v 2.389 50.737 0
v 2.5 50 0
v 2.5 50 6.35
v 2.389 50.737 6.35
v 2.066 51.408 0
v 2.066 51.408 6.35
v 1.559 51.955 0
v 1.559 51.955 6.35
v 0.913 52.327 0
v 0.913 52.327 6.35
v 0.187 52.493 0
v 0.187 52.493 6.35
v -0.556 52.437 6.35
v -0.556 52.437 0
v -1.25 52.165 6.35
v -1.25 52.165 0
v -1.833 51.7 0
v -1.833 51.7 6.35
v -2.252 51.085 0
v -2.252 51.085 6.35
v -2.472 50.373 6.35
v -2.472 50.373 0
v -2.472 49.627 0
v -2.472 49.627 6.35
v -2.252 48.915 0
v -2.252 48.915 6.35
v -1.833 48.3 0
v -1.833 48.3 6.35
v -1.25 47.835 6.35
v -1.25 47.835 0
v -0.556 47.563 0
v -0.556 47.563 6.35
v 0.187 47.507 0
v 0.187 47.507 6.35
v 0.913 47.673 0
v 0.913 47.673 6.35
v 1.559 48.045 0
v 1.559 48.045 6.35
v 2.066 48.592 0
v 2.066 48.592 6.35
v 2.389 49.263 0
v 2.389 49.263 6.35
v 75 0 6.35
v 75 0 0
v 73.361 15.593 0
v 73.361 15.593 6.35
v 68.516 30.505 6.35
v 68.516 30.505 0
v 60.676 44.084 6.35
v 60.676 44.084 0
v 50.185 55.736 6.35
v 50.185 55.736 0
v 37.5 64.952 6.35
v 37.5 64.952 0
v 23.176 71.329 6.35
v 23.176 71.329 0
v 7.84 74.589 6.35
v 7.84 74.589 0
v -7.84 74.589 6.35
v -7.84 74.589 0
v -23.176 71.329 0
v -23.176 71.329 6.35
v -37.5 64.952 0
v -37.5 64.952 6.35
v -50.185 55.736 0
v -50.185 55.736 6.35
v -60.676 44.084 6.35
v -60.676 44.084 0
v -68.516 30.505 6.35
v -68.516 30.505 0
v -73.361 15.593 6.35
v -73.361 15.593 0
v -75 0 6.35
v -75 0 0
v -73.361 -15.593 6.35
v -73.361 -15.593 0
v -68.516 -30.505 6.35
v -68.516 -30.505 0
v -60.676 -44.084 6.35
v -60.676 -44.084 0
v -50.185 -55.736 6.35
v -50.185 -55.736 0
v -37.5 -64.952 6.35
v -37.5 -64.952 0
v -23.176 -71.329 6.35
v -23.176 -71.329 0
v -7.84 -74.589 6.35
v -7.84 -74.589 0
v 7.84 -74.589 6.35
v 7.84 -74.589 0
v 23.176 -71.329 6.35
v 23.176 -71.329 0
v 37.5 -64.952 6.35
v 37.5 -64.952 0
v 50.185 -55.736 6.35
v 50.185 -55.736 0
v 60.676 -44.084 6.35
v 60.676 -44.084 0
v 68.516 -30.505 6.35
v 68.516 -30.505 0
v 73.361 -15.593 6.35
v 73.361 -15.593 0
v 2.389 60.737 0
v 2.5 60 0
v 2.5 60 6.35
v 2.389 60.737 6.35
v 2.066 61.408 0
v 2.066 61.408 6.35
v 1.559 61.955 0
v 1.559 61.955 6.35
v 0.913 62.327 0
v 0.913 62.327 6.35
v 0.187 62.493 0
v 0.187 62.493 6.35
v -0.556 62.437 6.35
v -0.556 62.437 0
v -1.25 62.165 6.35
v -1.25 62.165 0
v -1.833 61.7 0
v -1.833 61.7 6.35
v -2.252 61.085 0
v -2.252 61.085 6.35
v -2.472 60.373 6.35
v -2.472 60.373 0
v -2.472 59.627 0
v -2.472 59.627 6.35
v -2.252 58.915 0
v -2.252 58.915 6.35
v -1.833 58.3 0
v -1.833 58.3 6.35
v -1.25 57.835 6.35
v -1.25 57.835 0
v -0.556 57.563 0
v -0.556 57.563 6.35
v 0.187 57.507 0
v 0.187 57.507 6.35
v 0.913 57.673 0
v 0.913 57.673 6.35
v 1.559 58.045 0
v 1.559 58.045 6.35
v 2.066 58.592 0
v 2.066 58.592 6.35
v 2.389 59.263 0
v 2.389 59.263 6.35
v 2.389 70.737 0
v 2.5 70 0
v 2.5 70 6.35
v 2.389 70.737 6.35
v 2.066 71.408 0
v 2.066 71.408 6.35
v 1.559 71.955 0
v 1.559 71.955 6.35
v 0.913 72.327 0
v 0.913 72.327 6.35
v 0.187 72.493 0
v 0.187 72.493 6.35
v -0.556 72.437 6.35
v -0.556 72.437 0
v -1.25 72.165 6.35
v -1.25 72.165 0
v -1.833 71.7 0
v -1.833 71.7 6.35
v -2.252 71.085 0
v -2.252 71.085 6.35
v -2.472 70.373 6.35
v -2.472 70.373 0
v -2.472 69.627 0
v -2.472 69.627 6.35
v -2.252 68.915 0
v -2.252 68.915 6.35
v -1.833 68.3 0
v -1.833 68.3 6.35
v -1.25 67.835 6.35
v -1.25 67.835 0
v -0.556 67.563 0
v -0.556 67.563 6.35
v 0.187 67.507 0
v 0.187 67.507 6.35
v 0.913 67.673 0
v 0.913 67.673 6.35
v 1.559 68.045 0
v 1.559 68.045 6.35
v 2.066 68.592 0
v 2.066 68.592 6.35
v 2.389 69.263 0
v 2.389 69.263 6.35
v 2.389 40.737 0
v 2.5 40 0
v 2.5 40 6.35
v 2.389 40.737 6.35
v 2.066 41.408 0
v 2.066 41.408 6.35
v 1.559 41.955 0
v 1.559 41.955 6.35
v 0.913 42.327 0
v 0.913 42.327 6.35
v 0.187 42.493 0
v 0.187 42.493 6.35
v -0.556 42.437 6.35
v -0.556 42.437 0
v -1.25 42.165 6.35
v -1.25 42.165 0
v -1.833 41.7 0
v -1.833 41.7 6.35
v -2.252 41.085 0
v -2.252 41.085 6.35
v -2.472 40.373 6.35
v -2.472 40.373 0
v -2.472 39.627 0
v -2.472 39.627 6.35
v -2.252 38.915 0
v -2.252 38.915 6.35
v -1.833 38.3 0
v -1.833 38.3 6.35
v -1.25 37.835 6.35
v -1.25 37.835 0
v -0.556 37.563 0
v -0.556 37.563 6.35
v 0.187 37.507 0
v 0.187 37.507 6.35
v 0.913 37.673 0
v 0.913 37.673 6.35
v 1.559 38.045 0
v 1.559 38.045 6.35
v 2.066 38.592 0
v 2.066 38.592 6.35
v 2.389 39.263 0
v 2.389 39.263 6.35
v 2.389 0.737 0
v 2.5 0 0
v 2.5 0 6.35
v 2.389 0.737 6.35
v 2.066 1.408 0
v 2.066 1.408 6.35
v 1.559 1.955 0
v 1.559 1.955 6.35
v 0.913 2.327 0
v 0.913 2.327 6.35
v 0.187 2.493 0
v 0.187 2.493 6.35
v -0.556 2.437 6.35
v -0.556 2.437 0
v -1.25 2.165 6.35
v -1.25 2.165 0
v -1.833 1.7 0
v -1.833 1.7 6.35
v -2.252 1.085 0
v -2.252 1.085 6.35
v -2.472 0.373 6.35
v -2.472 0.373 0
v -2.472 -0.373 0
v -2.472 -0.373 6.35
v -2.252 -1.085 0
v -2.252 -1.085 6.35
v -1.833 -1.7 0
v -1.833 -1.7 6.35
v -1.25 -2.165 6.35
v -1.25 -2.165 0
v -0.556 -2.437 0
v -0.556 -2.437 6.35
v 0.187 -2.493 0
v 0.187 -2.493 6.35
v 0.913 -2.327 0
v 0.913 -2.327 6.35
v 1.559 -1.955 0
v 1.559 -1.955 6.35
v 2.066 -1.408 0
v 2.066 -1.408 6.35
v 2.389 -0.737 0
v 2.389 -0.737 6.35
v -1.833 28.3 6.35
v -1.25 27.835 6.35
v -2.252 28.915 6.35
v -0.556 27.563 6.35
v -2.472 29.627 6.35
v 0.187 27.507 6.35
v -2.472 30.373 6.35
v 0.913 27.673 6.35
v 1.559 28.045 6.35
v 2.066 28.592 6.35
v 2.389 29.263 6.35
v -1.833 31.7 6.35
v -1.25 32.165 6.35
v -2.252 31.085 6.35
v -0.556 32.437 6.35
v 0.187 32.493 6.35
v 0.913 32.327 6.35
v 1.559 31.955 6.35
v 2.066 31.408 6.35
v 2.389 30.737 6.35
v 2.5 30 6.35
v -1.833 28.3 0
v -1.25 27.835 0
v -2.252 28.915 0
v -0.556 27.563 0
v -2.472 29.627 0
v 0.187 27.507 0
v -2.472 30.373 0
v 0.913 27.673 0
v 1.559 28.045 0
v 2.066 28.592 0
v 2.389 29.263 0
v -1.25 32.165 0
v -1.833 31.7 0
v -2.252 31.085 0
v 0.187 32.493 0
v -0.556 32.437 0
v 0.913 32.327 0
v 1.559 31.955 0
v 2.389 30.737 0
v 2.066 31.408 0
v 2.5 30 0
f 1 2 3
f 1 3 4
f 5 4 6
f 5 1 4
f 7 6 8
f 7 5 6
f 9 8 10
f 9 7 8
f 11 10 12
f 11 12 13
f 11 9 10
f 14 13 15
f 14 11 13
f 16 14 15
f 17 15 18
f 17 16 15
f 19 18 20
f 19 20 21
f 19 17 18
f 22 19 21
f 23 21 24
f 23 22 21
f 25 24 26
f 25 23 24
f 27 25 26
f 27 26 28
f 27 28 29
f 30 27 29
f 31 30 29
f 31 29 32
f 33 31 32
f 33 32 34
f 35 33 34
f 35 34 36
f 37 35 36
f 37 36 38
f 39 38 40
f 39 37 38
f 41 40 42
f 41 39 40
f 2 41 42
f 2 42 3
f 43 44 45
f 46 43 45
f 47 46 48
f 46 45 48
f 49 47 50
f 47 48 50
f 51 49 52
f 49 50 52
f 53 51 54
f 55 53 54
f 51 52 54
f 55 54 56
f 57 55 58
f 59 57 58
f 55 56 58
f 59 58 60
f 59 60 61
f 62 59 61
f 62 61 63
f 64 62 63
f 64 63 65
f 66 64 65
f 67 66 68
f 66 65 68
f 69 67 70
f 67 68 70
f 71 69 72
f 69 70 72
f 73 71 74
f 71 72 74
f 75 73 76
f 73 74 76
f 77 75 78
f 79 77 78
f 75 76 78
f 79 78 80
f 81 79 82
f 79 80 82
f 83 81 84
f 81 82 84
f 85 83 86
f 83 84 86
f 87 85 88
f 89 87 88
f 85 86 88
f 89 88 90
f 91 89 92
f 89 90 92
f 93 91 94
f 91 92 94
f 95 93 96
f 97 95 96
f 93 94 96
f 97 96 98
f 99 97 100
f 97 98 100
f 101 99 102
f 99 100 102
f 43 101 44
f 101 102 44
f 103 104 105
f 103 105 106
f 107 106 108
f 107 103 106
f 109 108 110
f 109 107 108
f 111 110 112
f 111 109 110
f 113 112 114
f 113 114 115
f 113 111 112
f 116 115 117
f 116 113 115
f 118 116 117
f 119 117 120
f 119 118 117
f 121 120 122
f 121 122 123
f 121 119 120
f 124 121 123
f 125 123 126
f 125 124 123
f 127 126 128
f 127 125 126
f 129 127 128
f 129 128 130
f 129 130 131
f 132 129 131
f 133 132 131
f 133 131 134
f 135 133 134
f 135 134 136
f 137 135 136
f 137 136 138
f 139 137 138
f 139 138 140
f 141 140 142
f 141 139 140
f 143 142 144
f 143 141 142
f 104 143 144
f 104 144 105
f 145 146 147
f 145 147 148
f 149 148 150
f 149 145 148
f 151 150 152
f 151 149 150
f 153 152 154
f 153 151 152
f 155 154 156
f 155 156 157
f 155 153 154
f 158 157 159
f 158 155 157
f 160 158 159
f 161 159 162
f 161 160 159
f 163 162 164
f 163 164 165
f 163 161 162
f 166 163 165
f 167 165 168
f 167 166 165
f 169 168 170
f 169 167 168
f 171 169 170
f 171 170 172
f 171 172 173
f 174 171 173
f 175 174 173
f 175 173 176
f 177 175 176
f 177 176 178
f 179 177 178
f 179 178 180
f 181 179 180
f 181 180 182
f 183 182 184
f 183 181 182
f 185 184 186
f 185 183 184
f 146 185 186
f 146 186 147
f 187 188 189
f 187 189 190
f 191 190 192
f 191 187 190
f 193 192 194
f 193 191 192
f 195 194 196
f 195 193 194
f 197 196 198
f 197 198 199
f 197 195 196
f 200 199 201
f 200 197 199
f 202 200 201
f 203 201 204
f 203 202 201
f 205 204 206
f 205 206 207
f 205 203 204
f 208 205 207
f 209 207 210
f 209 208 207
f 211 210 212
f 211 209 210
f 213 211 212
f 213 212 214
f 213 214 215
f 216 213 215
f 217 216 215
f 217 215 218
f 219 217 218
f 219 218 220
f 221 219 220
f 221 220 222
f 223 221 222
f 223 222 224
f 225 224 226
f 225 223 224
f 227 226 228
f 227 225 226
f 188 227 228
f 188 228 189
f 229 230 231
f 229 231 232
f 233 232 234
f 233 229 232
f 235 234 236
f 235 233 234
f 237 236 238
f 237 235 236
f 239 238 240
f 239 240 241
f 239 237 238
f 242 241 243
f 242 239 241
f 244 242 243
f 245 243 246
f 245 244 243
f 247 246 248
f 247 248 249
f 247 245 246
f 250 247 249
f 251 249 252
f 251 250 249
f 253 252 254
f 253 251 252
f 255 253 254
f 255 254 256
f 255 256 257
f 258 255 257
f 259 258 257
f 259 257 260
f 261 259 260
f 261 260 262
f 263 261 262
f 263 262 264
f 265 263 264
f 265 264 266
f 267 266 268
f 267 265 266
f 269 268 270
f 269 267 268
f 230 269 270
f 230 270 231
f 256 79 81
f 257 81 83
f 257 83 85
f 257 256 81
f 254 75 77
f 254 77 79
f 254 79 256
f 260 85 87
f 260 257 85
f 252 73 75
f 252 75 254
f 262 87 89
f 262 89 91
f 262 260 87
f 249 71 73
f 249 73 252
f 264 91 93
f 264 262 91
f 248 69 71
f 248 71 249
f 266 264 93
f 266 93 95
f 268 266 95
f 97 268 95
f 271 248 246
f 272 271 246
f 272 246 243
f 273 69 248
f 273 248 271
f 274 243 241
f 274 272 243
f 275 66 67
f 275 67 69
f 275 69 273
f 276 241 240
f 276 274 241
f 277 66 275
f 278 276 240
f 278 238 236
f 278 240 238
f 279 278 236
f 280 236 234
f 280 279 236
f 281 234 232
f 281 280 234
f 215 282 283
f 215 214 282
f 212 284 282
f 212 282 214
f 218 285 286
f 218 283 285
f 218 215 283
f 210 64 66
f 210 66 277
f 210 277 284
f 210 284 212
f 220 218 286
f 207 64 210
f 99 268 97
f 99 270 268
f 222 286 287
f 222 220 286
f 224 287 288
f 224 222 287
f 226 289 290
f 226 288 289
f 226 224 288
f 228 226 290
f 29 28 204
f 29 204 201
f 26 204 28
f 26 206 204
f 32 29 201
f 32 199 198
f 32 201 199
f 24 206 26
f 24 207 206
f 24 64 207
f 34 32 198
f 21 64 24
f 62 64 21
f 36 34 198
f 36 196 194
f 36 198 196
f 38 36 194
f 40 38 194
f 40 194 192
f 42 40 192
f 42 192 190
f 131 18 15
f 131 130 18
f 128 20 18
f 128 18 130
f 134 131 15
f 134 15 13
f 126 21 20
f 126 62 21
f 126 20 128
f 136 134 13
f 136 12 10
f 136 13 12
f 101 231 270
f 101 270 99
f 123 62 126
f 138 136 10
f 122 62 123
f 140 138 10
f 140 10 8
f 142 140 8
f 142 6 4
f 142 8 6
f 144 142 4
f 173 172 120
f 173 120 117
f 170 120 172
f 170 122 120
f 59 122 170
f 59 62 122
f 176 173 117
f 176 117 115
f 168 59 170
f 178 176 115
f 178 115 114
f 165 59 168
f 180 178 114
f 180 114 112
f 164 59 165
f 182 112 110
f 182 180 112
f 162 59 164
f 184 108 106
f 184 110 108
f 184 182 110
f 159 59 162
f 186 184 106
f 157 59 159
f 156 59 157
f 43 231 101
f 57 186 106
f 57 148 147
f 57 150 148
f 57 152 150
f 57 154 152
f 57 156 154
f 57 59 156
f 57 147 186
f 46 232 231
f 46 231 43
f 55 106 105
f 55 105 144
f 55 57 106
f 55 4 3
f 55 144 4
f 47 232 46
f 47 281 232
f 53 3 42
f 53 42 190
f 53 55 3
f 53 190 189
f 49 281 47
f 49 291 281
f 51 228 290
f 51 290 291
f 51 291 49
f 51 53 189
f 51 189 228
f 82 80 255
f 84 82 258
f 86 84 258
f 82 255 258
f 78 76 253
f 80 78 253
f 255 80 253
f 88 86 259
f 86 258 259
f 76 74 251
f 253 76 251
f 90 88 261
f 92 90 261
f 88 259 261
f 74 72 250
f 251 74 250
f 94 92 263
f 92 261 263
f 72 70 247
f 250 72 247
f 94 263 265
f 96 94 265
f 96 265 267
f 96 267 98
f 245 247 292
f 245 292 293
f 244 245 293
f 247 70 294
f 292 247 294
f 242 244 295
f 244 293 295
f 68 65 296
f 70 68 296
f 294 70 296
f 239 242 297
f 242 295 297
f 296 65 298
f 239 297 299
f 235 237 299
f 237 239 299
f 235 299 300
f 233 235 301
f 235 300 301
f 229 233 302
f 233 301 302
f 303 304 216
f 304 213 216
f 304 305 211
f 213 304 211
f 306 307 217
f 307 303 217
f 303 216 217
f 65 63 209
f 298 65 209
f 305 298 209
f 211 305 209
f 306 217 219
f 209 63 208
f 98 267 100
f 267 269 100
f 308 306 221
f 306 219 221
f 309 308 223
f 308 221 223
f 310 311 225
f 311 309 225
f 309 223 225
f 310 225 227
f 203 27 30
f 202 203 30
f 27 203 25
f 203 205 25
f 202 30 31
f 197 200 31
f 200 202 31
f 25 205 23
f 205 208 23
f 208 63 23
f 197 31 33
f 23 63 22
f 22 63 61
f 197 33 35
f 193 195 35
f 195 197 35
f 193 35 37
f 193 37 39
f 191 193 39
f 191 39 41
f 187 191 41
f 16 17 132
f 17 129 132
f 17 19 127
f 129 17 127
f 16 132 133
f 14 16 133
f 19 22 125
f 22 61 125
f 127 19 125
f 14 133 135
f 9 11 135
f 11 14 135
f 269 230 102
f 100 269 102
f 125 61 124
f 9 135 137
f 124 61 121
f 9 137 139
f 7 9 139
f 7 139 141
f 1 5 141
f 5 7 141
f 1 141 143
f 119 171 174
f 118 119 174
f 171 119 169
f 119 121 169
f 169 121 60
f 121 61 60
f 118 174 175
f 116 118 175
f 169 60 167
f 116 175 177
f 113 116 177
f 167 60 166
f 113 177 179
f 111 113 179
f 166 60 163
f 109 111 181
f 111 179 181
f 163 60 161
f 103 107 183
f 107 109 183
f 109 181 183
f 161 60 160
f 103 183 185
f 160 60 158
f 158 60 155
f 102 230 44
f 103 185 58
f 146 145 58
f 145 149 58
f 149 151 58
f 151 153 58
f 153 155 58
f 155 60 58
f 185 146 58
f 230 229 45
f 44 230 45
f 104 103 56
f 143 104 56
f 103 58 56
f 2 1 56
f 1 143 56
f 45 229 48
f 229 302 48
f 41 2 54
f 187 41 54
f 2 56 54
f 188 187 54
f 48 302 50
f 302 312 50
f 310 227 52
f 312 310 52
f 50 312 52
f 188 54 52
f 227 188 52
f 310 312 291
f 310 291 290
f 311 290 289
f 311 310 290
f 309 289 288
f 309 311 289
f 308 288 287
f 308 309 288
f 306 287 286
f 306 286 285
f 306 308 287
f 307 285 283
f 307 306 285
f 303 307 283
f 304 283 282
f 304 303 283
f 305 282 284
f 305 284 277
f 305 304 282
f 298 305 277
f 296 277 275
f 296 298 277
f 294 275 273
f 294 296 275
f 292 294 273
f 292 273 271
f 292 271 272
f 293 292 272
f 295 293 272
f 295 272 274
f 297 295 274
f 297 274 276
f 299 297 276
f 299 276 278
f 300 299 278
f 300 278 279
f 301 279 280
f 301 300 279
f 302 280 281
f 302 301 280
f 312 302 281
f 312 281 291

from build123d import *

# Parameters (mm, degrees)
SKETCH1_R           = 75
SKETCH1_R_2         = 2.5
BOSS_EXTRUDE1_DEPTH = 6.35


with BuildPart() as part:
    # Sketch1 → Boss-Extrude1 (new body)
    with BuildSketch(Plane.XY):
        Circle(SKETCH1_R)
        with Locations((0, 30)):
            Circle(SKETCH1_R_2, mode=Mode.SUBTRACT)
        with Locations((0, 40)):
            Circle(SKETCH1_R_2, mode=Mode.SUBTRACT)
        with Locations((0, 50)):
            Circle(SKETCH1_R_2, mode=Mode.SUBTRACT)
        with Locations((0, 60)):
            Circle(SKETCH1_R_2, mode=Mode.SUBTRACT)
        with Locations((0, 70)):
            Circle(SKETCH1_R_2, mode=Mode.SUBTRACT)
        Circle(SKETCH1_R_2, mode=Mode.SUBTRACT)
    extrude(amount=BOSS_EXTRUDE1_DEPTH)


solid = part.part
